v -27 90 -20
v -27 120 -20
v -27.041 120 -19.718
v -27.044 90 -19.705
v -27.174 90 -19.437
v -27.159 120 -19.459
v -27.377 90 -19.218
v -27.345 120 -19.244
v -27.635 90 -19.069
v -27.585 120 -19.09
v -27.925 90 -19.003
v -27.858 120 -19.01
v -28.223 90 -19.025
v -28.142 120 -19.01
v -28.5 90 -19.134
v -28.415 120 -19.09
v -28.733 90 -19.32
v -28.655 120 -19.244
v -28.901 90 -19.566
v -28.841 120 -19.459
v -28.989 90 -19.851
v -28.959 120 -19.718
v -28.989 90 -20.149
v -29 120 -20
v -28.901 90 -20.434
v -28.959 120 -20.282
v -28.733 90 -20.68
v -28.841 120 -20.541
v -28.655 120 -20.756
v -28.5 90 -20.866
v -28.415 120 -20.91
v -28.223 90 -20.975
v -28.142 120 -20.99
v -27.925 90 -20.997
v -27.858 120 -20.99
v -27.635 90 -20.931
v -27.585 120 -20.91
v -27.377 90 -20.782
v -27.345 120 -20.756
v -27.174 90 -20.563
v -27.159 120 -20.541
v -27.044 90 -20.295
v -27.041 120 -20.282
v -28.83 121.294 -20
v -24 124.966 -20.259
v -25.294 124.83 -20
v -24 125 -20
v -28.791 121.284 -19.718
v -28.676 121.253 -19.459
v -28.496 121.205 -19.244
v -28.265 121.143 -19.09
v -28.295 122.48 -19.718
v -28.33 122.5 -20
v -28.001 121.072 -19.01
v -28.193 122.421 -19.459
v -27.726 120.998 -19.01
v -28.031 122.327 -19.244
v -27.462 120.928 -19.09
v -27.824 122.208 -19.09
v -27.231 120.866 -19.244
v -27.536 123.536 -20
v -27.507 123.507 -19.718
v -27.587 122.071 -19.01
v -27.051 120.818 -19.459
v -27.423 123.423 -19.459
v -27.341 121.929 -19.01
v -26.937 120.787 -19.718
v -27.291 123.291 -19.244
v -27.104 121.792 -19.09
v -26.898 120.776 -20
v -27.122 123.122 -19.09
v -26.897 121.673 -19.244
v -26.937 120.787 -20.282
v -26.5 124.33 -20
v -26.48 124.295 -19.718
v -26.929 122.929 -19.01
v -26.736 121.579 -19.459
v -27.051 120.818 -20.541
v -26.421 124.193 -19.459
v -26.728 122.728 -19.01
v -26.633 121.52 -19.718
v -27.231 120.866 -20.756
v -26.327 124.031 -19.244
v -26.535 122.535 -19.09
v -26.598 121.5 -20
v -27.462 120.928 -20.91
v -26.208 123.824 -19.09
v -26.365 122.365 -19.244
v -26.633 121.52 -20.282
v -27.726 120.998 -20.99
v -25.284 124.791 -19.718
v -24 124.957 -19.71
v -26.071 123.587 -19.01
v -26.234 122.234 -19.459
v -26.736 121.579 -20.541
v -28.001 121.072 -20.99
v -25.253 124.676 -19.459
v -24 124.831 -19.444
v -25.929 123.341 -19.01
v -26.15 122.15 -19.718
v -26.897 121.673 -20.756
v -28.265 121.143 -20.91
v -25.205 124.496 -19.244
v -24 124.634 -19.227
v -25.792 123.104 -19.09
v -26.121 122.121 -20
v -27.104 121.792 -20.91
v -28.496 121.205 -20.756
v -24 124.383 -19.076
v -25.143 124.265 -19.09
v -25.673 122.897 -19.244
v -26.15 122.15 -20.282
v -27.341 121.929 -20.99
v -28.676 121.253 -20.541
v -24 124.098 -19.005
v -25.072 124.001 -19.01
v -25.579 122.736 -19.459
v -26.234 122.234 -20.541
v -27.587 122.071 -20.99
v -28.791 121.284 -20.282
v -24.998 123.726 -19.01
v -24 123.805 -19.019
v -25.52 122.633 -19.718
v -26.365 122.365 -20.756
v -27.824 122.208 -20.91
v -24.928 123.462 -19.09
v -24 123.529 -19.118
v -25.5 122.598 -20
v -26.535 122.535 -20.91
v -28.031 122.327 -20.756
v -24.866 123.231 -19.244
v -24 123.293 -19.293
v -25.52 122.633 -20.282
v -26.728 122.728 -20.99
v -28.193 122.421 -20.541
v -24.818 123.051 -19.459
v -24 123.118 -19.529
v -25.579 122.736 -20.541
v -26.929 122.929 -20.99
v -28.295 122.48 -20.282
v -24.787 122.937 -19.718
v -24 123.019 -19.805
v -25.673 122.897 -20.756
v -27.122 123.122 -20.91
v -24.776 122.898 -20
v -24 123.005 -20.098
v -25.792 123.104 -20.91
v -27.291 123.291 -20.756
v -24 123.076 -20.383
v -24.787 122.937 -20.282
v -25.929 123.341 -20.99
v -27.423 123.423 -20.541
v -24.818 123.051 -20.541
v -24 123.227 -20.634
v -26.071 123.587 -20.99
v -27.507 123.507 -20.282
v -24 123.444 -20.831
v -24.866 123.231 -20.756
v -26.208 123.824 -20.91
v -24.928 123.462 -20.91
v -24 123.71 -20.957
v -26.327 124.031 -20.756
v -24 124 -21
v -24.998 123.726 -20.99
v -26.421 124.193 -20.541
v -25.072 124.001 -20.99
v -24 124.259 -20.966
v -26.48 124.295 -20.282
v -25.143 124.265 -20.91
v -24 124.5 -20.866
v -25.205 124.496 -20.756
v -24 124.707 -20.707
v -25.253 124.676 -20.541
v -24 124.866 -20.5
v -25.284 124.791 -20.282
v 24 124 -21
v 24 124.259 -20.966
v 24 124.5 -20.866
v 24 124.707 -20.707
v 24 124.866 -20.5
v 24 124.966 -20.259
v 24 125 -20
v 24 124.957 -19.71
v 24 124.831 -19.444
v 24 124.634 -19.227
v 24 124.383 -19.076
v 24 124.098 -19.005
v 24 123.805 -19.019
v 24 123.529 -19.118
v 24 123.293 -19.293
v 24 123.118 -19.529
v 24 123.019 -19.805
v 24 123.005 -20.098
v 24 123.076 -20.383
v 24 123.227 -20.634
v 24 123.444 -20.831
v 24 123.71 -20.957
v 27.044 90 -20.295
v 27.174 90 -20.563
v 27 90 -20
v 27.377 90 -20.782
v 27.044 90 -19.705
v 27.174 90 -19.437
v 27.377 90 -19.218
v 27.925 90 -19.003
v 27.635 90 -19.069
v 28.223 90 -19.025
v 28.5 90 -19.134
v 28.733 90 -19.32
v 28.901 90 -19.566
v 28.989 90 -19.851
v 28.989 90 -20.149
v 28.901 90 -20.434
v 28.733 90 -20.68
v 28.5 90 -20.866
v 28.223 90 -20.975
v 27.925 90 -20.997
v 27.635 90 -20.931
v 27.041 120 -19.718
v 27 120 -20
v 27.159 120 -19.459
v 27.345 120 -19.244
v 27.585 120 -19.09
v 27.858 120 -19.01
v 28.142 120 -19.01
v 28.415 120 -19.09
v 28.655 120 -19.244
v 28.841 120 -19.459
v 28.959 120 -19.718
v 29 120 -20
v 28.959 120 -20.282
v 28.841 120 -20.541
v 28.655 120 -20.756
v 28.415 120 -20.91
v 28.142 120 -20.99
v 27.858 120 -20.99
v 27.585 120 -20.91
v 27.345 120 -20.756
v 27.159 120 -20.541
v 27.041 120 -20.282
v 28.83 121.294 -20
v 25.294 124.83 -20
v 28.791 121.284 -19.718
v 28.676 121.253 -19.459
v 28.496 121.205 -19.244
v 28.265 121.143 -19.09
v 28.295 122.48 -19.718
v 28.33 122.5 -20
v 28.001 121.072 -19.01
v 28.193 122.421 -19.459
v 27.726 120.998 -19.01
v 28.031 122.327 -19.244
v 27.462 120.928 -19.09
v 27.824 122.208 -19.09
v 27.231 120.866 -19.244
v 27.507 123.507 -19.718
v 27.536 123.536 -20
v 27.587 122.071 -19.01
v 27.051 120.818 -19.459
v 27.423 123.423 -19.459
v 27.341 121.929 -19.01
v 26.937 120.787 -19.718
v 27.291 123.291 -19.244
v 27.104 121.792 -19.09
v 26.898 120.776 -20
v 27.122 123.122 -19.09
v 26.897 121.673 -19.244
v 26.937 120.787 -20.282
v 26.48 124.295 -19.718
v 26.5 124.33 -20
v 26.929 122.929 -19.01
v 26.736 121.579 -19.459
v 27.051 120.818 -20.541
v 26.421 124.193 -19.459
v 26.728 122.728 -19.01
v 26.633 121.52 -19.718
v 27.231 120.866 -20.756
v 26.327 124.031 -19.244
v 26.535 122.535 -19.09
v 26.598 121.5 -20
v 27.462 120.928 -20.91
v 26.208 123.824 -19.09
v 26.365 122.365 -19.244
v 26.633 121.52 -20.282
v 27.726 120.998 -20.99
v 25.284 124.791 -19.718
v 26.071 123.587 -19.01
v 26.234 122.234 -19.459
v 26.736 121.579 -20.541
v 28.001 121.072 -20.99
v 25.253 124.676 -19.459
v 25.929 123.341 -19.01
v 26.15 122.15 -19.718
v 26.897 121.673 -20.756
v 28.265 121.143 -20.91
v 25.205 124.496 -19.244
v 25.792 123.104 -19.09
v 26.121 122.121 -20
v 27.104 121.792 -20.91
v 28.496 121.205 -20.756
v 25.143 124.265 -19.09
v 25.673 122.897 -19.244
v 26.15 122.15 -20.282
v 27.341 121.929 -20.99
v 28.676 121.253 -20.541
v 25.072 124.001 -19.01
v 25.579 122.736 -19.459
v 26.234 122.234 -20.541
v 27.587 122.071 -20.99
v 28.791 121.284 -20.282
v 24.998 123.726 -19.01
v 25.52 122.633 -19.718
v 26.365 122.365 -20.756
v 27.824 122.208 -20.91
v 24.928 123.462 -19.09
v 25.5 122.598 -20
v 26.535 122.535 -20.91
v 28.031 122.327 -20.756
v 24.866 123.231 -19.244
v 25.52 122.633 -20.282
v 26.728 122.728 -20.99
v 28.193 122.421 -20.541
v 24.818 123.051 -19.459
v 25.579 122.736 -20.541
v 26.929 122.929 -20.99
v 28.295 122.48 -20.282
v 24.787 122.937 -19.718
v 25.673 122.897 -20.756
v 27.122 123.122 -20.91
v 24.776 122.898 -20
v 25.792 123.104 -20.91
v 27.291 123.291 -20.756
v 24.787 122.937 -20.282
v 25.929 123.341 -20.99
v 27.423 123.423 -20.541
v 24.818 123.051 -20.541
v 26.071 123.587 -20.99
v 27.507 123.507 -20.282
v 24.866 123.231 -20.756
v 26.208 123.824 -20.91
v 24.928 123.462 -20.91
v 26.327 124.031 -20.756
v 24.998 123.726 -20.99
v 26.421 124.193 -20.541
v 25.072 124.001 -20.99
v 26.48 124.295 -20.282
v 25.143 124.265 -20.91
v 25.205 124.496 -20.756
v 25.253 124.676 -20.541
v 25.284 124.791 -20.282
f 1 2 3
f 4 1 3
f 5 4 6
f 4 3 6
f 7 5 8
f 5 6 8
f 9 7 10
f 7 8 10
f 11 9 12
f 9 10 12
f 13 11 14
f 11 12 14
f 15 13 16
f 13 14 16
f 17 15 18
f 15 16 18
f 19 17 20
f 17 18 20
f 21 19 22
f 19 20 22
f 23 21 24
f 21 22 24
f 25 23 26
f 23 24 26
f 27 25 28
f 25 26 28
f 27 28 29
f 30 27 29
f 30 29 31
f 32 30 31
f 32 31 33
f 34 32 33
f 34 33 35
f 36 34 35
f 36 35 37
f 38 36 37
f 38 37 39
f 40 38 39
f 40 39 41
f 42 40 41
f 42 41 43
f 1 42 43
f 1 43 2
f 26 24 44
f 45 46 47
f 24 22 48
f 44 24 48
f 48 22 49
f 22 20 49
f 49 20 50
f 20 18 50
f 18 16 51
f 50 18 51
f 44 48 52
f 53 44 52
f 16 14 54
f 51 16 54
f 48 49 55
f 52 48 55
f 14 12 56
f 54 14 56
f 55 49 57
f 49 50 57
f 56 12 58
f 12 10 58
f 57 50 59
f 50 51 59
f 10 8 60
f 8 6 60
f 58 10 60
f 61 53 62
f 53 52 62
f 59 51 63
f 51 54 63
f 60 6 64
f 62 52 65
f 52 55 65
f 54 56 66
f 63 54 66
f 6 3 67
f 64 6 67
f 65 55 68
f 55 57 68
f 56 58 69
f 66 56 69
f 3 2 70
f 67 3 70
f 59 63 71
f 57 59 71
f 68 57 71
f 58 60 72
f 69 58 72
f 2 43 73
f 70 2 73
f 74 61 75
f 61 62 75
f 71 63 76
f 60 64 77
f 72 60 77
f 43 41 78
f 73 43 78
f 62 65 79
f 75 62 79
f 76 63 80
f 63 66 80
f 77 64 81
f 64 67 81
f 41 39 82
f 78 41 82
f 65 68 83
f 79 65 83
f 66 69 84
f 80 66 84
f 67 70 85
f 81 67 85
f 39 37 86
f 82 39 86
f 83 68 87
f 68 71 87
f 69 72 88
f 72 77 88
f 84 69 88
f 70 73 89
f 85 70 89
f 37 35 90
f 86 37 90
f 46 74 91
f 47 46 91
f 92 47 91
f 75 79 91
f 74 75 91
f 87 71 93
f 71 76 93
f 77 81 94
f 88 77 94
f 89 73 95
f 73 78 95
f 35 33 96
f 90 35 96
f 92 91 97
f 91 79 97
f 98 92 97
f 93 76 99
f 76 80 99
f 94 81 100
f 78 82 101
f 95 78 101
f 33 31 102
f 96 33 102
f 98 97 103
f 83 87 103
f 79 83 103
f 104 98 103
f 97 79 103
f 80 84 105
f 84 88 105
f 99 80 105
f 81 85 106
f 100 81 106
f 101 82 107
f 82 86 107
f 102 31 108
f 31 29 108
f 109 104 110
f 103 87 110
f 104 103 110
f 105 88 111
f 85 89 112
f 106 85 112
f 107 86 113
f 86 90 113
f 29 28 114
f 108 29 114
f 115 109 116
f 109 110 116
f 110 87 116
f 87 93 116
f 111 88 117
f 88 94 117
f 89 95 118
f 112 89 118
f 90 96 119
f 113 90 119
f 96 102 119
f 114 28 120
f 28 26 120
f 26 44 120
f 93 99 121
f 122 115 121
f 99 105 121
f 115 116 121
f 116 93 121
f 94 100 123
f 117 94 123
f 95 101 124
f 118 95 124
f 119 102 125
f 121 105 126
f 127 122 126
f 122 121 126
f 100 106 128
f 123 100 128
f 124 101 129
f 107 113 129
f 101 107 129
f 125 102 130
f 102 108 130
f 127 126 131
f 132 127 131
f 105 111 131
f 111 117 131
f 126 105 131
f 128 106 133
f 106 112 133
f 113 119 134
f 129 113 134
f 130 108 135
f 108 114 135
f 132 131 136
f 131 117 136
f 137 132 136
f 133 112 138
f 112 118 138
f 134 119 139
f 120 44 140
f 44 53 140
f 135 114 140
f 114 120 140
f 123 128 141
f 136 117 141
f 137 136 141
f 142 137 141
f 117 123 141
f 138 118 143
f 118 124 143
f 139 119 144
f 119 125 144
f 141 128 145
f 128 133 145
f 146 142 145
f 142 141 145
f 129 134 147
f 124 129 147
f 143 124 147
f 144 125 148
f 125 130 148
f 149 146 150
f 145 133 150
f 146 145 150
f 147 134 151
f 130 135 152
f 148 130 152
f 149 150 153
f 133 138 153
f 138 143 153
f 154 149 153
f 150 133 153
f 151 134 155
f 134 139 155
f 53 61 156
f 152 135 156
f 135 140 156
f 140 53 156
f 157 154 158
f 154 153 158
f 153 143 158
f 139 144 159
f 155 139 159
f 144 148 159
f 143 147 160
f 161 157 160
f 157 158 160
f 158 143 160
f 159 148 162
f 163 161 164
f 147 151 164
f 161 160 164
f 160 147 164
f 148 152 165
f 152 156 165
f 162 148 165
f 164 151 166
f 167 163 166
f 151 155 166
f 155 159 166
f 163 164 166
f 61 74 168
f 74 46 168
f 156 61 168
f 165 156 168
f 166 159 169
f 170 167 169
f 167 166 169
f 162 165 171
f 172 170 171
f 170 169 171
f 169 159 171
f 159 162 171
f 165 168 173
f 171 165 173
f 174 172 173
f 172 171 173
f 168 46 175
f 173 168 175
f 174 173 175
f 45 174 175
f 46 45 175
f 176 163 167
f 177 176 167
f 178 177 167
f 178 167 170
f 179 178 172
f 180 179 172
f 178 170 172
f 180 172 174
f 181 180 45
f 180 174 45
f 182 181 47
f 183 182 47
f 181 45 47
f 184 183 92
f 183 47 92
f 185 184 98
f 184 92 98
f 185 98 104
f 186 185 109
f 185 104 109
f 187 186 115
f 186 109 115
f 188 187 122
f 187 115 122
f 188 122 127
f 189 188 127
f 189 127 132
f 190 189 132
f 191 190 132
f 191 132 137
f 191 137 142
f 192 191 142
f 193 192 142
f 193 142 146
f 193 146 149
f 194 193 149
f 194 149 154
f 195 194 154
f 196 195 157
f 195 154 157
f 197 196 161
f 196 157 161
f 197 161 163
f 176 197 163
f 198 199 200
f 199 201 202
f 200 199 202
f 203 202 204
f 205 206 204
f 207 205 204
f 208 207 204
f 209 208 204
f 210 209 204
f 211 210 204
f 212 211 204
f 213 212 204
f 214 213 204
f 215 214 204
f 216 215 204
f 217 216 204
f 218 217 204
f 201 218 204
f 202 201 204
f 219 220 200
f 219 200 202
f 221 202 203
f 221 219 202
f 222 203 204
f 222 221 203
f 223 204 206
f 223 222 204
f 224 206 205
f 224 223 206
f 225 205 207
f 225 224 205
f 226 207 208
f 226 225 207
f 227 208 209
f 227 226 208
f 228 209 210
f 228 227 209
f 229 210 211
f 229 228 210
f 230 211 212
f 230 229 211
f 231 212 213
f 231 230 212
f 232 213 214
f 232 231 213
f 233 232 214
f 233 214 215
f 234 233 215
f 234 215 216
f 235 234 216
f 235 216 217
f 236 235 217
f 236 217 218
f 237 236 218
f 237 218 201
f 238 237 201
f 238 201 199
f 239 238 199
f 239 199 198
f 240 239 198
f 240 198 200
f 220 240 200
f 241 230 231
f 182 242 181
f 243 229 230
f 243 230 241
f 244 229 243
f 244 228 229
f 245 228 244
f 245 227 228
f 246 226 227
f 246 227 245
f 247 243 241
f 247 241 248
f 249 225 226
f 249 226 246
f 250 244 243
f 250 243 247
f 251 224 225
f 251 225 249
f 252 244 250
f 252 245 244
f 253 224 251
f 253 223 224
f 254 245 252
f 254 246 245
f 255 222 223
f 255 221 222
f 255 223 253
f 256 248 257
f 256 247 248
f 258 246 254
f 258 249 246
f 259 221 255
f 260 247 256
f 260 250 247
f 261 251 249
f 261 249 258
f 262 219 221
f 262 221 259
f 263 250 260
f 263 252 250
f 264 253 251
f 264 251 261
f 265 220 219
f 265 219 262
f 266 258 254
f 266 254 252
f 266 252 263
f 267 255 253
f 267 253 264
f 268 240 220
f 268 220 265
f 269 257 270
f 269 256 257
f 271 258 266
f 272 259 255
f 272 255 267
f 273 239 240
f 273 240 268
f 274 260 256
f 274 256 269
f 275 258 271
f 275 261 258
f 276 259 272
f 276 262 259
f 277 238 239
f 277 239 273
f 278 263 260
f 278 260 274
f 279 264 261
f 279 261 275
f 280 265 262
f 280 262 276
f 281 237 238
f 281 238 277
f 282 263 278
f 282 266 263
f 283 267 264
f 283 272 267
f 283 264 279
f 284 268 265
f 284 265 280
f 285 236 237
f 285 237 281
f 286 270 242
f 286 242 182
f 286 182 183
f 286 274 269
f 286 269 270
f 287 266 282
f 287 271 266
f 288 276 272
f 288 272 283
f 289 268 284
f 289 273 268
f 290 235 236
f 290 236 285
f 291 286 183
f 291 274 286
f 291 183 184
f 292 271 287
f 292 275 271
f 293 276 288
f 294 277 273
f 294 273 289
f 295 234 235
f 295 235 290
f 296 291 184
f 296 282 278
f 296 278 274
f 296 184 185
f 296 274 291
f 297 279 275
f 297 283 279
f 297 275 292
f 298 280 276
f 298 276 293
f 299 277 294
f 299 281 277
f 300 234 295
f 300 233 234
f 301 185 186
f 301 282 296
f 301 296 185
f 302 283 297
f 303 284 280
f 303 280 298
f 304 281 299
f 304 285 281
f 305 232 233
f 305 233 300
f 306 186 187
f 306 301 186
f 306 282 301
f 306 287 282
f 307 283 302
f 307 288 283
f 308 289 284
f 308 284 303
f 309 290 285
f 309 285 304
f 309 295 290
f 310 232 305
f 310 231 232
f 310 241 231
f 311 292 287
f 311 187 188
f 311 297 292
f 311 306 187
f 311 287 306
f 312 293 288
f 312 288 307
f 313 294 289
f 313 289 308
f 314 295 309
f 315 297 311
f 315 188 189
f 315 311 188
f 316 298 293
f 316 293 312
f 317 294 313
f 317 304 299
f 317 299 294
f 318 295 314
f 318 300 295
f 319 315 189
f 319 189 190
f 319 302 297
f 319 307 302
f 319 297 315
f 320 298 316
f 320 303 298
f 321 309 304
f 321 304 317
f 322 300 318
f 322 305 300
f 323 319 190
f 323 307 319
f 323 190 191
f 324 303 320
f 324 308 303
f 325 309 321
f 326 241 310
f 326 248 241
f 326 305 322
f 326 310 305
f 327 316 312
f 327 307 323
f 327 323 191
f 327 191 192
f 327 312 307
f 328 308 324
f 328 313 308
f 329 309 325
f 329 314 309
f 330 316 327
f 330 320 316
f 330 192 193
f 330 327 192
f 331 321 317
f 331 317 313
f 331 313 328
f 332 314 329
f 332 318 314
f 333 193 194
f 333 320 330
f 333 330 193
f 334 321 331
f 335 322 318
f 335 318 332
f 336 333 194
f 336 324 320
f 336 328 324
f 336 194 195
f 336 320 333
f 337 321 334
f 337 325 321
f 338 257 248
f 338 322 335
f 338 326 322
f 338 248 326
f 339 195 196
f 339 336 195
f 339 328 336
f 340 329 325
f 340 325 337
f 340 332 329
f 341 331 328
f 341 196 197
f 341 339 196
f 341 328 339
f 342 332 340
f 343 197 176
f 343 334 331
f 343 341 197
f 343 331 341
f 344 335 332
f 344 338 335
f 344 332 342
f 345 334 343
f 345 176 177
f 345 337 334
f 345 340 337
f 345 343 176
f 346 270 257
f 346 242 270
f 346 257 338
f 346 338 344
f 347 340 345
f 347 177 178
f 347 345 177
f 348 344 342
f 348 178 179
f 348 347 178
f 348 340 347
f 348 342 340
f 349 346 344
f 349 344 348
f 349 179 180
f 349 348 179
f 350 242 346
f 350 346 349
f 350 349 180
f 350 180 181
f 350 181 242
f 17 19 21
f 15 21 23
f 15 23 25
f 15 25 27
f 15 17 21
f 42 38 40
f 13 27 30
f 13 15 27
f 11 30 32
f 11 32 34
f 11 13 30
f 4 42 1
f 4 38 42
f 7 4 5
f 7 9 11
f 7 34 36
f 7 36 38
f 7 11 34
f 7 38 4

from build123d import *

# Parameters (mm, degrees)
TORUS_R           = 1
TORUS_ANGLE       = 90
CYLINDER002_R     = 1
CYLINDER002_DEPTH = 30
CYLINDER004_R     = 1
CYLINDER004_DEPTH = 48


with BuildPart() as torus:
    # Torus → Torus (revolve)
    with BuildSketch(Plane(origin=(24, 120, 0), x_dir=(1, 0, 0), z_dir=(0, -1, 0))):
        with Locations((4, 0)):
            Circle(TORUS_R)
    revolve(axis=Axis((24, 120, 0), (0, 0, 1)), revolution_arc=TORUS_ANGLE)


with BuildPart() as collector002:
    # Cylinder002 → Cylinder002 (new body)
    with BuildSketch(Plane(origin=(-28, 120, 0), x_dir=(1, 0, 0), z_dir=(0, -1, 0))):
        Circle(CYLINDER002_R)
    extrude(amount=CYLINDER002_DEPTH)


with BuildPart() as topsupportss:
    # Part__Mirroring002: instance of Collector002
    add(collector002.part.mirror(Plane(origin=(0, 0, 0), x_dir=(0, -1, 0), z_dir=(1, 0, 0))))


with BuildPart() as cylinder:
    # Cylinder004 → Cylinder004 (new body)
    with BuildSketch(Plane(origin=(-24, 124, 0), x_dir=(0, 0, -1), z_dir=(1, 0, 0))):
        Circle(CYLINDER004_R)
    extrude(amount=CYLINDER004_DEPTH)


with BuildPart() as cathodetopss:
    # Part__Mirroring003: instance of Torus
    add(torus.part.mirror(Plane(origin=(0, 0, 0), x_dir=(0, -1, 0), z_dir=(1, 0, 0))))

    # Fusion: union Torus, Collector002, TopSupportSS, Cylinder
    add(torus.part)
    add(collector002.part)
    add(topsupportss.part)
    add(cylinder.part)


with BuildPart() as cathodetopss_1:
    # Fusion placement: moved
    add(cathodetopss.part.moved(Location((0, 0, -20))))


solid = cathodetopss_1.part
